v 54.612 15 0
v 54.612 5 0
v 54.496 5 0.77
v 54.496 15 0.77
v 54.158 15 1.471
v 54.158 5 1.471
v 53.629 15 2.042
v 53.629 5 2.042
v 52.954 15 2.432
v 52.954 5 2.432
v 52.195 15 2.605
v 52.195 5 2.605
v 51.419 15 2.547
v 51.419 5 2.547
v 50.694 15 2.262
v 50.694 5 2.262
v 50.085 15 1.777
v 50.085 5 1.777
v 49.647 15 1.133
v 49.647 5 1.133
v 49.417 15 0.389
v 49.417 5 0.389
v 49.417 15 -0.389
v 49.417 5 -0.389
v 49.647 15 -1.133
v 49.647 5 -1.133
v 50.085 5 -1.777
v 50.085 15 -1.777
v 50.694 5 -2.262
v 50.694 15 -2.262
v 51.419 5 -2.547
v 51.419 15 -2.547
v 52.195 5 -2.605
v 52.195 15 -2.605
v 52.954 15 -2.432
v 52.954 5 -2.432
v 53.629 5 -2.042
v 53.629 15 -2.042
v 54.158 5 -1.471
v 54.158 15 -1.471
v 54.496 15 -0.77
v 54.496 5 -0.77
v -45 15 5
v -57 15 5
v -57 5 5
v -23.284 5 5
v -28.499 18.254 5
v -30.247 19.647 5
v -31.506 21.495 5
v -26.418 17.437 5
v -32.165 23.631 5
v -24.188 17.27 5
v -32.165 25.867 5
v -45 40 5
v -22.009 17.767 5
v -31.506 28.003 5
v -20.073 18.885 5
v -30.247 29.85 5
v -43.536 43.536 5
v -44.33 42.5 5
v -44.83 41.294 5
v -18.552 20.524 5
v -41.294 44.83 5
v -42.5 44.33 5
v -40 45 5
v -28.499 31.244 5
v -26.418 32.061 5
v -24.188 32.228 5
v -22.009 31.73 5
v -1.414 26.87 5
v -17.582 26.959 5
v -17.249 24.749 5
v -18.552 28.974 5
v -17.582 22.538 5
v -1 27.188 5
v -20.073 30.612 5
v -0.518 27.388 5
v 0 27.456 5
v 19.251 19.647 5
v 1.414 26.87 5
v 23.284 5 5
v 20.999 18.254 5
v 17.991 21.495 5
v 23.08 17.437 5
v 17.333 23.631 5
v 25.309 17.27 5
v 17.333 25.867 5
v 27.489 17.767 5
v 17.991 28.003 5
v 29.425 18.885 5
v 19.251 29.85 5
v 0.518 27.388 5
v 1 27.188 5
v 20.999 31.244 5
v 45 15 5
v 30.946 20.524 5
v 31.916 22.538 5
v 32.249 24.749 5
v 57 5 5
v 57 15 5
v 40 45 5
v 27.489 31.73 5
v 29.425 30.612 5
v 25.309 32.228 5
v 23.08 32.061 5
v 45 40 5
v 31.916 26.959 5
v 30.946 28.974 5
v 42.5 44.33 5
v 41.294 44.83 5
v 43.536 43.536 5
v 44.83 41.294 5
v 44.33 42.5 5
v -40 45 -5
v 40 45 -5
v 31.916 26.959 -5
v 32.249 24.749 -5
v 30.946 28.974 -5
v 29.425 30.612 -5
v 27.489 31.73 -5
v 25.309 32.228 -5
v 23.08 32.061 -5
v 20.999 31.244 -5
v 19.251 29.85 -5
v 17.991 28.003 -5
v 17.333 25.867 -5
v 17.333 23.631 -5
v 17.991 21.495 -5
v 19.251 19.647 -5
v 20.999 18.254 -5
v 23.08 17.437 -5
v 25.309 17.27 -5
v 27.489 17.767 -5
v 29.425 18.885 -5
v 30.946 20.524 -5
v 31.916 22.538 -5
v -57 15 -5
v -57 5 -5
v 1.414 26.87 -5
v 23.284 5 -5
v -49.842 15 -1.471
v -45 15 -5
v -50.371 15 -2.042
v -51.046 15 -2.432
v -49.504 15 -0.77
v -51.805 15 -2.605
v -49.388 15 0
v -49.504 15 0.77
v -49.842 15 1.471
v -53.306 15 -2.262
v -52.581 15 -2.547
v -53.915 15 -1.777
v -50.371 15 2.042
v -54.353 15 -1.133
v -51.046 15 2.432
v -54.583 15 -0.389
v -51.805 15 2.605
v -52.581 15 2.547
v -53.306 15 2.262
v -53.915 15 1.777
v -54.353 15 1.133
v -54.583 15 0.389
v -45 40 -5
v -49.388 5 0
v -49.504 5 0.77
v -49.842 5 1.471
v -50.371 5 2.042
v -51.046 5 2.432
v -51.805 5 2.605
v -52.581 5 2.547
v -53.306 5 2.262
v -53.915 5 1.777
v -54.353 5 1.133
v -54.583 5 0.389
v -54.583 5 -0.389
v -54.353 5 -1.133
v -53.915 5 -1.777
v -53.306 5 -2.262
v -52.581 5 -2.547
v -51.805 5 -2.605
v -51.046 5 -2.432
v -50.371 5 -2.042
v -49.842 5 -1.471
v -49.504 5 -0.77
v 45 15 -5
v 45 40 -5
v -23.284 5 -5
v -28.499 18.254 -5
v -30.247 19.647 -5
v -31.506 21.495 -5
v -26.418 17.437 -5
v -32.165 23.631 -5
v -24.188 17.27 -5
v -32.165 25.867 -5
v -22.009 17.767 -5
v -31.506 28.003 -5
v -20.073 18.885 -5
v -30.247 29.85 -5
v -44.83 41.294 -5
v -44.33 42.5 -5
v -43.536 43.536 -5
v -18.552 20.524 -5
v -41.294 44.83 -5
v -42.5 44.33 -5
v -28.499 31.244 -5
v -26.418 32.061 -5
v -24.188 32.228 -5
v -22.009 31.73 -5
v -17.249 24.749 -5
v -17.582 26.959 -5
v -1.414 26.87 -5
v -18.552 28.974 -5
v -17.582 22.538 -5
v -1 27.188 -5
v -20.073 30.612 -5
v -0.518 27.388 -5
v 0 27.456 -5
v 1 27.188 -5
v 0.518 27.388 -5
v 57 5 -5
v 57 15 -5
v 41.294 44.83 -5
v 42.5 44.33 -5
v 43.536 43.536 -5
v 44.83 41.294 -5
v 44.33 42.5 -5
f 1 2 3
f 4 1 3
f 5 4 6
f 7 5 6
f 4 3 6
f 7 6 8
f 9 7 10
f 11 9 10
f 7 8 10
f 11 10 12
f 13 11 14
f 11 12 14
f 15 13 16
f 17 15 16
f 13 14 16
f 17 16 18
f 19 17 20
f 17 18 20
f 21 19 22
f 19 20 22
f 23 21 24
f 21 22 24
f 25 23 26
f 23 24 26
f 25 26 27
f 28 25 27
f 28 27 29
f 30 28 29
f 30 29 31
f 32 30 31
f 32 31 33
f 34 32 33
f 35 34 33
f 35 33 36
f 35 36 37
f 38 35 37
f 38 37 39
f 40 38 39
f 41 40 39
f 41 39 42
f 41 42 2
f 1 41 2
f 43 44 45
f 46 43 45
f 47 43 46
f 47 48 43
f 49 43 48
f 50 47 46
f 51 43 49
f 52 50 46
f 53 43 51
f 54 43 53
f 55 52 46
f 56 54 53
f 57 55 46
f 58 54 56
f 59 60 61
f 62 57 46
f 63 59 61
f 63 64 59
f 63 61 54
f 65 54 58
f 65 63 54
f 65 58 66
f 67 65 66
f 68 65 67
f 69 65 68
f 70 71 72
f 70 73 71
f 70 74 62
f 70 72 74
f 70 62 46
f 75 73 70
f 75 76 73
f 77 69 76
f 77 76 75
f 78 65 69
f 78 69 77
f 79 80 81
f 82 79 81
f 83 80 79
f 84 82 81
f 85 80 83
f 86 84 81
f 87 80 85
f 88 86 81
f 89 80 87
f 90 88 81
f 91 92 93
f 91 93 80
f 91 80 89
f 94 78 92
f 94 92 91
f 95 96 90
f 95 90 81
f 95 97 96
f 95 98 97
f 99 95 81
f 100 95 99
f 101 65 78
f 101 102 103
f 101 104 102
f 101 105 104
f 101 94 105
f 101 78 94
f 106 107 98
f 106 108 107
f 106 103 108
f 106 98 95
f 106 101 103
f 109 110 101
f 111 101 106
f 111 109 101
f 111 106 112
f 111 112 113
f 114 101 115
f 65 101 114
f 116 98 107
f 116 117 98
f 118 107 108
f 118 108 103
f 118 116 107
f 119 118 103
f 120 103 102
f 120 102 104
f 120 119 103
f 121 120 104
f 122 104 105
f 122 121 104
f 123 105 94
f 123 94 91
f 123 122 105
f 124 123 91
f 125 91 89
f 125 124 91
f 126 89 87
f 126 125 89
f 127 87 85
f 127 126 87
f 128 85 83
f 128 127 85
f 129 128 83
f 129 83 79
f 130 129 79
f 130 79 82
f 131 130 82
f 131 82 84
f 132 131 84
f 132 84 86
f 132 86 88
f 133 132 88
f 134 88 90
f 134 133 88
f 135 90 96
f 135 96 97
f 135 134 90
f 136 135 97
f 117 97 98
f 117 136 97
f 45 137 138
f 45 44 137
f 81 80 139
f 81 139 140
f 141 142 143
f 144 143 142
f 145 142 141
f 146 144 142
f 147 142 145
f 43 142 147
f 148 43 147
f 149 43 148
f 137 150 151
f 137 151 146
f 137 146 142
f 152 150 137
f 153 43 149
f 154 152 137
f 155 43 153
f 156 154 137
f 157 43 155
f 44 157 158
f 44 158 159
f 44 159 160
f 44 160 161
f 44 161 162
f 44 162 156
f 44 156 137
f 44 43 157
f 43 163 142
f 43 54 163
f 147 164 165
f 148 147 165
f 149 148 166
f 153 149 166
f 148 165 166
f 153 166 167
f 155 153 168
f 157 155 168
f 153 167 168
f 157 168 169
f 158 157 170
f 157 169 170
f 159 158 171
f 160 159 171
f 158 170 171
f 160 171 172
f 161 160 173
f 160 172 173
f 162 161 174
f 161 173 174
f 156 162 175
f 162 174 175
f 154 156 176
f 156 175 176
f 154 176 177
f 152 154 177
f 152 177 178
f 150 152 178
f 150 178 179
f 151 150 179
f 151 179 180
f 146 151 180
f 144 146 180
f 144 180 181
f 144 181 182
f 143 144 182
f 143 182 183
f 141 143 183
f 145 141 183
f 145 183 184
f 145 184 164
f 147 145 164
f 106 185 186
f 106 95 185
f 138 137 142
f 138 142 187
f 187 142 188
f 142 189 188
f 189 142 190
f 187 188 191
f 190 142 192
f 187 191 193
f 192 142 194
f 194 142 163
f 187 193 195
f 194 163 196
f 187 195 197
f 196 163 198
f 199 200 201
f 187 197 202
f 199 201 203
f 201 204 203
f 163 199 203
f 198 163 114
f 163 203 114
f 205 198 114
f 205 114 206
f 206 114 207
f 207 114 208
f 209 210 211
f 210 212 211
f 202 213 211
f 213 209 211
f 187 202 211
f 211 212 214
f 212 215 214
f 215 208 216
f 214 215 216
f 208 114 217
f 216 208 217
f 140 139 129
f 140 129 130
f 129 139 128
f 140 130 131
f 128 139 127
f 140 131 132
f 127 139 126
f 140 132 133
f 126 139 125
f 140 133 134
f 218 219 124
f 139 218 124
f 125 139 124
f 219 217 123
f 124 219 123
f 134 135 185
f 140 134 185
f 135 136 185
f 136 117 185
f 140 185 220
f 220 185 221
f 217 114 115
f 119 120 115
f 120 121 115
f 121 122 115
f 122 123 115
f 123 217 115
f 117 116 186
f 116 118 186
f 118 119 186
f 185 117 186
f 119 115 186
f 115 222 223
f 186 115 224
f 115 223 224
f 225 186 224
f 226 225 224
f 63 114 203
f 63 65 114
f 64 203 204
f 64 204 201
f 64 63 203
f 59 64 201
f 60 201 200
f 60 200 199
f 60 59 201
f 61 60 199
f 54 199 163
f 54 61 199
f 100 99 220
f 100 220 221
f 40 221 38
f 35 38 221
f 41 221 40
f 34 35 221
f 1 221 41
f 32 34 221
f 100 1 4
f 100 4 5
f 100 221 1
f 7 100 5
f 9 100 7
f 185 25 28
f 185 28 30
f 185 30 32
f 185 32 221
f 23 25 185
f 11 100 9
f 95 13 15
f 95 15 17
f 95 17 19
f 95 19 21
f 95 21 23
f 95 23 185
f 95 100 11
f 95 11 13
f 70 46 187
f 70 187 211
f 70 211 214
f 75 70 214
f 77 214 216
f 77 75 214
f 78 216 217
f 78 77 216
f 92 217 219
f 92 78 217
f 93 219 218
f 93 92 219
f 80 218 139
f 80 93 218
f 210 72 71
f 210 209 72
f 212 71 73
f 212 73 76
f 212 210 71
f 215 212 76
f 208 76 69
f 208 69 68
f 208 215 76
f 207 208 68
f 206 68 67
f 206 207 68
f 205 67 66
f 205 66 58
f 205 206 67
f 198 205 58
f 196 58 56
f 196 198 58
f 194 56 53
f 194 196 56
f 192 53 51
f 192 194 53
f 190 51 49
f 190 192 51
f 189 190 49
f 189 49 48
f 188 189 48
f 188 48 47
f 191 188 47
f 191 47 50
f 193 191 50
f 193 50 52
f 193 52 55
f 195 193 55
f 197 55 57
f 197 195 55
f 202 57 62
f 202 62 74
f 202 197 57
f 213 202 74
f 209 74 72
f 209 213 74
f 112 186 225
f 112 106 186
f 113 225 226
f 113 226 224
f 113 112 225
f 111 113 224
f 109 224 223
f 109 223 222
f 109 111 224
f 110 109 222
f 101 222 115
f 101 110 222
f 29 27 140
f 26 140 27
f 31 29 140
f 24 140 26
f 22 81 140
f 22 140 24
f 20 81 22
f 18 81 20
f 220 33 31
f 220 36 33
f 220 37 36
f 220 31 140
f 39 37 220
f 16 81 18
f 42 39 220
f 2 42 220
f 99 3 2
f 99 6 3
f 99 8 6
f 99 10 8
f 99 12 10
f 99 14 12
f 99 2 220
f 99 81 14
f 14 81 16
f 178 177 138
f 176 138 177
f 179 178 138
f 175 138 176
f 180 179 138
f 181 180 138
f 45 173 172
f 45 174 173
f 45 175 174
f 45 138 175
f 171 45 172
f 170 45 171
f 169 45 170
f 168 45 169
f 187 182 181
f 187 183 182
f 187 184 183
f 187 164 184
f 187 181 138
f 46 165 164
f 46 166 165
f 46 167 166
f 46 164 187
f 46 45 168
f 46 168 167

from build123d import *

# Parameters (mm, degrees)
SKETCH_1_R          = 7.5
EXTRUDE_1_DEPTH     = 5
SKETCH_2_R          = 2.612095194
CUT_EXTRUDE_1_DEPTH = 41


with BuildPart() as part:
    # 草圖1 → 填料-伸長1 (new body, symmetric)
    with BuildSketch(Plane.XY):
        with BuildLine():
            Line((-57, 15), (-57, 5))
            Line((-57, 5), (-23.284271247, 5))
            Line((-23.284271247, 5), (-1.414213562, 26.870057685))
            ThreePointArc((-1.414213562, 26.870057685), (0, 27.455844123), (1.414213562, 26.870057685))
            Line((1.414213562, 26.870057685), (23.284271247, 5))
            Line((23.284271247, 5), (57, 5))
            Line((57, 5), (57, 15))
            Line((57, 15), (45, 15))
            Line((45, 15), (45, 40))
            ThreePointArc((45, 40), (43.535533906, 43.535533906), (40, 45))
            Line((40, 45), (-40, 45))
            ThreePointArc((-40, 45), (-43.535533906, 43.535533906), (-45, 40))
            Line((-45, 40), (-45, 15))
            Line((-45, 15), (-57, 15))
        make_face()
        with Locations((-24.748737342, 24.748737342)):
            Circle(SKETCH_1_R, mode=Mode.SUBTRACT)
        with Locations((24.748737342, 24.748737342)):
            Circle(SKETCH_1_R, mode=Mode.SUBTRACT)
    extrude(amount=EXTRUDE_1_DEPTH, both=True)

    # 草圖2 → 除料-伸長1 (cut, through all)
    with BuildSketch(Plane.XZ.offset(-5)):
        with Locations((-52, 0)):
            Circle(SKETCH_2_R)
        with Locations((52, 0)):
            Circle(SKETCH_2_R)
    extrude(amount=-CUT_EXTRUDE_1_DEPTH, mode=Mode.SUBTRACT)


solid = part.part
